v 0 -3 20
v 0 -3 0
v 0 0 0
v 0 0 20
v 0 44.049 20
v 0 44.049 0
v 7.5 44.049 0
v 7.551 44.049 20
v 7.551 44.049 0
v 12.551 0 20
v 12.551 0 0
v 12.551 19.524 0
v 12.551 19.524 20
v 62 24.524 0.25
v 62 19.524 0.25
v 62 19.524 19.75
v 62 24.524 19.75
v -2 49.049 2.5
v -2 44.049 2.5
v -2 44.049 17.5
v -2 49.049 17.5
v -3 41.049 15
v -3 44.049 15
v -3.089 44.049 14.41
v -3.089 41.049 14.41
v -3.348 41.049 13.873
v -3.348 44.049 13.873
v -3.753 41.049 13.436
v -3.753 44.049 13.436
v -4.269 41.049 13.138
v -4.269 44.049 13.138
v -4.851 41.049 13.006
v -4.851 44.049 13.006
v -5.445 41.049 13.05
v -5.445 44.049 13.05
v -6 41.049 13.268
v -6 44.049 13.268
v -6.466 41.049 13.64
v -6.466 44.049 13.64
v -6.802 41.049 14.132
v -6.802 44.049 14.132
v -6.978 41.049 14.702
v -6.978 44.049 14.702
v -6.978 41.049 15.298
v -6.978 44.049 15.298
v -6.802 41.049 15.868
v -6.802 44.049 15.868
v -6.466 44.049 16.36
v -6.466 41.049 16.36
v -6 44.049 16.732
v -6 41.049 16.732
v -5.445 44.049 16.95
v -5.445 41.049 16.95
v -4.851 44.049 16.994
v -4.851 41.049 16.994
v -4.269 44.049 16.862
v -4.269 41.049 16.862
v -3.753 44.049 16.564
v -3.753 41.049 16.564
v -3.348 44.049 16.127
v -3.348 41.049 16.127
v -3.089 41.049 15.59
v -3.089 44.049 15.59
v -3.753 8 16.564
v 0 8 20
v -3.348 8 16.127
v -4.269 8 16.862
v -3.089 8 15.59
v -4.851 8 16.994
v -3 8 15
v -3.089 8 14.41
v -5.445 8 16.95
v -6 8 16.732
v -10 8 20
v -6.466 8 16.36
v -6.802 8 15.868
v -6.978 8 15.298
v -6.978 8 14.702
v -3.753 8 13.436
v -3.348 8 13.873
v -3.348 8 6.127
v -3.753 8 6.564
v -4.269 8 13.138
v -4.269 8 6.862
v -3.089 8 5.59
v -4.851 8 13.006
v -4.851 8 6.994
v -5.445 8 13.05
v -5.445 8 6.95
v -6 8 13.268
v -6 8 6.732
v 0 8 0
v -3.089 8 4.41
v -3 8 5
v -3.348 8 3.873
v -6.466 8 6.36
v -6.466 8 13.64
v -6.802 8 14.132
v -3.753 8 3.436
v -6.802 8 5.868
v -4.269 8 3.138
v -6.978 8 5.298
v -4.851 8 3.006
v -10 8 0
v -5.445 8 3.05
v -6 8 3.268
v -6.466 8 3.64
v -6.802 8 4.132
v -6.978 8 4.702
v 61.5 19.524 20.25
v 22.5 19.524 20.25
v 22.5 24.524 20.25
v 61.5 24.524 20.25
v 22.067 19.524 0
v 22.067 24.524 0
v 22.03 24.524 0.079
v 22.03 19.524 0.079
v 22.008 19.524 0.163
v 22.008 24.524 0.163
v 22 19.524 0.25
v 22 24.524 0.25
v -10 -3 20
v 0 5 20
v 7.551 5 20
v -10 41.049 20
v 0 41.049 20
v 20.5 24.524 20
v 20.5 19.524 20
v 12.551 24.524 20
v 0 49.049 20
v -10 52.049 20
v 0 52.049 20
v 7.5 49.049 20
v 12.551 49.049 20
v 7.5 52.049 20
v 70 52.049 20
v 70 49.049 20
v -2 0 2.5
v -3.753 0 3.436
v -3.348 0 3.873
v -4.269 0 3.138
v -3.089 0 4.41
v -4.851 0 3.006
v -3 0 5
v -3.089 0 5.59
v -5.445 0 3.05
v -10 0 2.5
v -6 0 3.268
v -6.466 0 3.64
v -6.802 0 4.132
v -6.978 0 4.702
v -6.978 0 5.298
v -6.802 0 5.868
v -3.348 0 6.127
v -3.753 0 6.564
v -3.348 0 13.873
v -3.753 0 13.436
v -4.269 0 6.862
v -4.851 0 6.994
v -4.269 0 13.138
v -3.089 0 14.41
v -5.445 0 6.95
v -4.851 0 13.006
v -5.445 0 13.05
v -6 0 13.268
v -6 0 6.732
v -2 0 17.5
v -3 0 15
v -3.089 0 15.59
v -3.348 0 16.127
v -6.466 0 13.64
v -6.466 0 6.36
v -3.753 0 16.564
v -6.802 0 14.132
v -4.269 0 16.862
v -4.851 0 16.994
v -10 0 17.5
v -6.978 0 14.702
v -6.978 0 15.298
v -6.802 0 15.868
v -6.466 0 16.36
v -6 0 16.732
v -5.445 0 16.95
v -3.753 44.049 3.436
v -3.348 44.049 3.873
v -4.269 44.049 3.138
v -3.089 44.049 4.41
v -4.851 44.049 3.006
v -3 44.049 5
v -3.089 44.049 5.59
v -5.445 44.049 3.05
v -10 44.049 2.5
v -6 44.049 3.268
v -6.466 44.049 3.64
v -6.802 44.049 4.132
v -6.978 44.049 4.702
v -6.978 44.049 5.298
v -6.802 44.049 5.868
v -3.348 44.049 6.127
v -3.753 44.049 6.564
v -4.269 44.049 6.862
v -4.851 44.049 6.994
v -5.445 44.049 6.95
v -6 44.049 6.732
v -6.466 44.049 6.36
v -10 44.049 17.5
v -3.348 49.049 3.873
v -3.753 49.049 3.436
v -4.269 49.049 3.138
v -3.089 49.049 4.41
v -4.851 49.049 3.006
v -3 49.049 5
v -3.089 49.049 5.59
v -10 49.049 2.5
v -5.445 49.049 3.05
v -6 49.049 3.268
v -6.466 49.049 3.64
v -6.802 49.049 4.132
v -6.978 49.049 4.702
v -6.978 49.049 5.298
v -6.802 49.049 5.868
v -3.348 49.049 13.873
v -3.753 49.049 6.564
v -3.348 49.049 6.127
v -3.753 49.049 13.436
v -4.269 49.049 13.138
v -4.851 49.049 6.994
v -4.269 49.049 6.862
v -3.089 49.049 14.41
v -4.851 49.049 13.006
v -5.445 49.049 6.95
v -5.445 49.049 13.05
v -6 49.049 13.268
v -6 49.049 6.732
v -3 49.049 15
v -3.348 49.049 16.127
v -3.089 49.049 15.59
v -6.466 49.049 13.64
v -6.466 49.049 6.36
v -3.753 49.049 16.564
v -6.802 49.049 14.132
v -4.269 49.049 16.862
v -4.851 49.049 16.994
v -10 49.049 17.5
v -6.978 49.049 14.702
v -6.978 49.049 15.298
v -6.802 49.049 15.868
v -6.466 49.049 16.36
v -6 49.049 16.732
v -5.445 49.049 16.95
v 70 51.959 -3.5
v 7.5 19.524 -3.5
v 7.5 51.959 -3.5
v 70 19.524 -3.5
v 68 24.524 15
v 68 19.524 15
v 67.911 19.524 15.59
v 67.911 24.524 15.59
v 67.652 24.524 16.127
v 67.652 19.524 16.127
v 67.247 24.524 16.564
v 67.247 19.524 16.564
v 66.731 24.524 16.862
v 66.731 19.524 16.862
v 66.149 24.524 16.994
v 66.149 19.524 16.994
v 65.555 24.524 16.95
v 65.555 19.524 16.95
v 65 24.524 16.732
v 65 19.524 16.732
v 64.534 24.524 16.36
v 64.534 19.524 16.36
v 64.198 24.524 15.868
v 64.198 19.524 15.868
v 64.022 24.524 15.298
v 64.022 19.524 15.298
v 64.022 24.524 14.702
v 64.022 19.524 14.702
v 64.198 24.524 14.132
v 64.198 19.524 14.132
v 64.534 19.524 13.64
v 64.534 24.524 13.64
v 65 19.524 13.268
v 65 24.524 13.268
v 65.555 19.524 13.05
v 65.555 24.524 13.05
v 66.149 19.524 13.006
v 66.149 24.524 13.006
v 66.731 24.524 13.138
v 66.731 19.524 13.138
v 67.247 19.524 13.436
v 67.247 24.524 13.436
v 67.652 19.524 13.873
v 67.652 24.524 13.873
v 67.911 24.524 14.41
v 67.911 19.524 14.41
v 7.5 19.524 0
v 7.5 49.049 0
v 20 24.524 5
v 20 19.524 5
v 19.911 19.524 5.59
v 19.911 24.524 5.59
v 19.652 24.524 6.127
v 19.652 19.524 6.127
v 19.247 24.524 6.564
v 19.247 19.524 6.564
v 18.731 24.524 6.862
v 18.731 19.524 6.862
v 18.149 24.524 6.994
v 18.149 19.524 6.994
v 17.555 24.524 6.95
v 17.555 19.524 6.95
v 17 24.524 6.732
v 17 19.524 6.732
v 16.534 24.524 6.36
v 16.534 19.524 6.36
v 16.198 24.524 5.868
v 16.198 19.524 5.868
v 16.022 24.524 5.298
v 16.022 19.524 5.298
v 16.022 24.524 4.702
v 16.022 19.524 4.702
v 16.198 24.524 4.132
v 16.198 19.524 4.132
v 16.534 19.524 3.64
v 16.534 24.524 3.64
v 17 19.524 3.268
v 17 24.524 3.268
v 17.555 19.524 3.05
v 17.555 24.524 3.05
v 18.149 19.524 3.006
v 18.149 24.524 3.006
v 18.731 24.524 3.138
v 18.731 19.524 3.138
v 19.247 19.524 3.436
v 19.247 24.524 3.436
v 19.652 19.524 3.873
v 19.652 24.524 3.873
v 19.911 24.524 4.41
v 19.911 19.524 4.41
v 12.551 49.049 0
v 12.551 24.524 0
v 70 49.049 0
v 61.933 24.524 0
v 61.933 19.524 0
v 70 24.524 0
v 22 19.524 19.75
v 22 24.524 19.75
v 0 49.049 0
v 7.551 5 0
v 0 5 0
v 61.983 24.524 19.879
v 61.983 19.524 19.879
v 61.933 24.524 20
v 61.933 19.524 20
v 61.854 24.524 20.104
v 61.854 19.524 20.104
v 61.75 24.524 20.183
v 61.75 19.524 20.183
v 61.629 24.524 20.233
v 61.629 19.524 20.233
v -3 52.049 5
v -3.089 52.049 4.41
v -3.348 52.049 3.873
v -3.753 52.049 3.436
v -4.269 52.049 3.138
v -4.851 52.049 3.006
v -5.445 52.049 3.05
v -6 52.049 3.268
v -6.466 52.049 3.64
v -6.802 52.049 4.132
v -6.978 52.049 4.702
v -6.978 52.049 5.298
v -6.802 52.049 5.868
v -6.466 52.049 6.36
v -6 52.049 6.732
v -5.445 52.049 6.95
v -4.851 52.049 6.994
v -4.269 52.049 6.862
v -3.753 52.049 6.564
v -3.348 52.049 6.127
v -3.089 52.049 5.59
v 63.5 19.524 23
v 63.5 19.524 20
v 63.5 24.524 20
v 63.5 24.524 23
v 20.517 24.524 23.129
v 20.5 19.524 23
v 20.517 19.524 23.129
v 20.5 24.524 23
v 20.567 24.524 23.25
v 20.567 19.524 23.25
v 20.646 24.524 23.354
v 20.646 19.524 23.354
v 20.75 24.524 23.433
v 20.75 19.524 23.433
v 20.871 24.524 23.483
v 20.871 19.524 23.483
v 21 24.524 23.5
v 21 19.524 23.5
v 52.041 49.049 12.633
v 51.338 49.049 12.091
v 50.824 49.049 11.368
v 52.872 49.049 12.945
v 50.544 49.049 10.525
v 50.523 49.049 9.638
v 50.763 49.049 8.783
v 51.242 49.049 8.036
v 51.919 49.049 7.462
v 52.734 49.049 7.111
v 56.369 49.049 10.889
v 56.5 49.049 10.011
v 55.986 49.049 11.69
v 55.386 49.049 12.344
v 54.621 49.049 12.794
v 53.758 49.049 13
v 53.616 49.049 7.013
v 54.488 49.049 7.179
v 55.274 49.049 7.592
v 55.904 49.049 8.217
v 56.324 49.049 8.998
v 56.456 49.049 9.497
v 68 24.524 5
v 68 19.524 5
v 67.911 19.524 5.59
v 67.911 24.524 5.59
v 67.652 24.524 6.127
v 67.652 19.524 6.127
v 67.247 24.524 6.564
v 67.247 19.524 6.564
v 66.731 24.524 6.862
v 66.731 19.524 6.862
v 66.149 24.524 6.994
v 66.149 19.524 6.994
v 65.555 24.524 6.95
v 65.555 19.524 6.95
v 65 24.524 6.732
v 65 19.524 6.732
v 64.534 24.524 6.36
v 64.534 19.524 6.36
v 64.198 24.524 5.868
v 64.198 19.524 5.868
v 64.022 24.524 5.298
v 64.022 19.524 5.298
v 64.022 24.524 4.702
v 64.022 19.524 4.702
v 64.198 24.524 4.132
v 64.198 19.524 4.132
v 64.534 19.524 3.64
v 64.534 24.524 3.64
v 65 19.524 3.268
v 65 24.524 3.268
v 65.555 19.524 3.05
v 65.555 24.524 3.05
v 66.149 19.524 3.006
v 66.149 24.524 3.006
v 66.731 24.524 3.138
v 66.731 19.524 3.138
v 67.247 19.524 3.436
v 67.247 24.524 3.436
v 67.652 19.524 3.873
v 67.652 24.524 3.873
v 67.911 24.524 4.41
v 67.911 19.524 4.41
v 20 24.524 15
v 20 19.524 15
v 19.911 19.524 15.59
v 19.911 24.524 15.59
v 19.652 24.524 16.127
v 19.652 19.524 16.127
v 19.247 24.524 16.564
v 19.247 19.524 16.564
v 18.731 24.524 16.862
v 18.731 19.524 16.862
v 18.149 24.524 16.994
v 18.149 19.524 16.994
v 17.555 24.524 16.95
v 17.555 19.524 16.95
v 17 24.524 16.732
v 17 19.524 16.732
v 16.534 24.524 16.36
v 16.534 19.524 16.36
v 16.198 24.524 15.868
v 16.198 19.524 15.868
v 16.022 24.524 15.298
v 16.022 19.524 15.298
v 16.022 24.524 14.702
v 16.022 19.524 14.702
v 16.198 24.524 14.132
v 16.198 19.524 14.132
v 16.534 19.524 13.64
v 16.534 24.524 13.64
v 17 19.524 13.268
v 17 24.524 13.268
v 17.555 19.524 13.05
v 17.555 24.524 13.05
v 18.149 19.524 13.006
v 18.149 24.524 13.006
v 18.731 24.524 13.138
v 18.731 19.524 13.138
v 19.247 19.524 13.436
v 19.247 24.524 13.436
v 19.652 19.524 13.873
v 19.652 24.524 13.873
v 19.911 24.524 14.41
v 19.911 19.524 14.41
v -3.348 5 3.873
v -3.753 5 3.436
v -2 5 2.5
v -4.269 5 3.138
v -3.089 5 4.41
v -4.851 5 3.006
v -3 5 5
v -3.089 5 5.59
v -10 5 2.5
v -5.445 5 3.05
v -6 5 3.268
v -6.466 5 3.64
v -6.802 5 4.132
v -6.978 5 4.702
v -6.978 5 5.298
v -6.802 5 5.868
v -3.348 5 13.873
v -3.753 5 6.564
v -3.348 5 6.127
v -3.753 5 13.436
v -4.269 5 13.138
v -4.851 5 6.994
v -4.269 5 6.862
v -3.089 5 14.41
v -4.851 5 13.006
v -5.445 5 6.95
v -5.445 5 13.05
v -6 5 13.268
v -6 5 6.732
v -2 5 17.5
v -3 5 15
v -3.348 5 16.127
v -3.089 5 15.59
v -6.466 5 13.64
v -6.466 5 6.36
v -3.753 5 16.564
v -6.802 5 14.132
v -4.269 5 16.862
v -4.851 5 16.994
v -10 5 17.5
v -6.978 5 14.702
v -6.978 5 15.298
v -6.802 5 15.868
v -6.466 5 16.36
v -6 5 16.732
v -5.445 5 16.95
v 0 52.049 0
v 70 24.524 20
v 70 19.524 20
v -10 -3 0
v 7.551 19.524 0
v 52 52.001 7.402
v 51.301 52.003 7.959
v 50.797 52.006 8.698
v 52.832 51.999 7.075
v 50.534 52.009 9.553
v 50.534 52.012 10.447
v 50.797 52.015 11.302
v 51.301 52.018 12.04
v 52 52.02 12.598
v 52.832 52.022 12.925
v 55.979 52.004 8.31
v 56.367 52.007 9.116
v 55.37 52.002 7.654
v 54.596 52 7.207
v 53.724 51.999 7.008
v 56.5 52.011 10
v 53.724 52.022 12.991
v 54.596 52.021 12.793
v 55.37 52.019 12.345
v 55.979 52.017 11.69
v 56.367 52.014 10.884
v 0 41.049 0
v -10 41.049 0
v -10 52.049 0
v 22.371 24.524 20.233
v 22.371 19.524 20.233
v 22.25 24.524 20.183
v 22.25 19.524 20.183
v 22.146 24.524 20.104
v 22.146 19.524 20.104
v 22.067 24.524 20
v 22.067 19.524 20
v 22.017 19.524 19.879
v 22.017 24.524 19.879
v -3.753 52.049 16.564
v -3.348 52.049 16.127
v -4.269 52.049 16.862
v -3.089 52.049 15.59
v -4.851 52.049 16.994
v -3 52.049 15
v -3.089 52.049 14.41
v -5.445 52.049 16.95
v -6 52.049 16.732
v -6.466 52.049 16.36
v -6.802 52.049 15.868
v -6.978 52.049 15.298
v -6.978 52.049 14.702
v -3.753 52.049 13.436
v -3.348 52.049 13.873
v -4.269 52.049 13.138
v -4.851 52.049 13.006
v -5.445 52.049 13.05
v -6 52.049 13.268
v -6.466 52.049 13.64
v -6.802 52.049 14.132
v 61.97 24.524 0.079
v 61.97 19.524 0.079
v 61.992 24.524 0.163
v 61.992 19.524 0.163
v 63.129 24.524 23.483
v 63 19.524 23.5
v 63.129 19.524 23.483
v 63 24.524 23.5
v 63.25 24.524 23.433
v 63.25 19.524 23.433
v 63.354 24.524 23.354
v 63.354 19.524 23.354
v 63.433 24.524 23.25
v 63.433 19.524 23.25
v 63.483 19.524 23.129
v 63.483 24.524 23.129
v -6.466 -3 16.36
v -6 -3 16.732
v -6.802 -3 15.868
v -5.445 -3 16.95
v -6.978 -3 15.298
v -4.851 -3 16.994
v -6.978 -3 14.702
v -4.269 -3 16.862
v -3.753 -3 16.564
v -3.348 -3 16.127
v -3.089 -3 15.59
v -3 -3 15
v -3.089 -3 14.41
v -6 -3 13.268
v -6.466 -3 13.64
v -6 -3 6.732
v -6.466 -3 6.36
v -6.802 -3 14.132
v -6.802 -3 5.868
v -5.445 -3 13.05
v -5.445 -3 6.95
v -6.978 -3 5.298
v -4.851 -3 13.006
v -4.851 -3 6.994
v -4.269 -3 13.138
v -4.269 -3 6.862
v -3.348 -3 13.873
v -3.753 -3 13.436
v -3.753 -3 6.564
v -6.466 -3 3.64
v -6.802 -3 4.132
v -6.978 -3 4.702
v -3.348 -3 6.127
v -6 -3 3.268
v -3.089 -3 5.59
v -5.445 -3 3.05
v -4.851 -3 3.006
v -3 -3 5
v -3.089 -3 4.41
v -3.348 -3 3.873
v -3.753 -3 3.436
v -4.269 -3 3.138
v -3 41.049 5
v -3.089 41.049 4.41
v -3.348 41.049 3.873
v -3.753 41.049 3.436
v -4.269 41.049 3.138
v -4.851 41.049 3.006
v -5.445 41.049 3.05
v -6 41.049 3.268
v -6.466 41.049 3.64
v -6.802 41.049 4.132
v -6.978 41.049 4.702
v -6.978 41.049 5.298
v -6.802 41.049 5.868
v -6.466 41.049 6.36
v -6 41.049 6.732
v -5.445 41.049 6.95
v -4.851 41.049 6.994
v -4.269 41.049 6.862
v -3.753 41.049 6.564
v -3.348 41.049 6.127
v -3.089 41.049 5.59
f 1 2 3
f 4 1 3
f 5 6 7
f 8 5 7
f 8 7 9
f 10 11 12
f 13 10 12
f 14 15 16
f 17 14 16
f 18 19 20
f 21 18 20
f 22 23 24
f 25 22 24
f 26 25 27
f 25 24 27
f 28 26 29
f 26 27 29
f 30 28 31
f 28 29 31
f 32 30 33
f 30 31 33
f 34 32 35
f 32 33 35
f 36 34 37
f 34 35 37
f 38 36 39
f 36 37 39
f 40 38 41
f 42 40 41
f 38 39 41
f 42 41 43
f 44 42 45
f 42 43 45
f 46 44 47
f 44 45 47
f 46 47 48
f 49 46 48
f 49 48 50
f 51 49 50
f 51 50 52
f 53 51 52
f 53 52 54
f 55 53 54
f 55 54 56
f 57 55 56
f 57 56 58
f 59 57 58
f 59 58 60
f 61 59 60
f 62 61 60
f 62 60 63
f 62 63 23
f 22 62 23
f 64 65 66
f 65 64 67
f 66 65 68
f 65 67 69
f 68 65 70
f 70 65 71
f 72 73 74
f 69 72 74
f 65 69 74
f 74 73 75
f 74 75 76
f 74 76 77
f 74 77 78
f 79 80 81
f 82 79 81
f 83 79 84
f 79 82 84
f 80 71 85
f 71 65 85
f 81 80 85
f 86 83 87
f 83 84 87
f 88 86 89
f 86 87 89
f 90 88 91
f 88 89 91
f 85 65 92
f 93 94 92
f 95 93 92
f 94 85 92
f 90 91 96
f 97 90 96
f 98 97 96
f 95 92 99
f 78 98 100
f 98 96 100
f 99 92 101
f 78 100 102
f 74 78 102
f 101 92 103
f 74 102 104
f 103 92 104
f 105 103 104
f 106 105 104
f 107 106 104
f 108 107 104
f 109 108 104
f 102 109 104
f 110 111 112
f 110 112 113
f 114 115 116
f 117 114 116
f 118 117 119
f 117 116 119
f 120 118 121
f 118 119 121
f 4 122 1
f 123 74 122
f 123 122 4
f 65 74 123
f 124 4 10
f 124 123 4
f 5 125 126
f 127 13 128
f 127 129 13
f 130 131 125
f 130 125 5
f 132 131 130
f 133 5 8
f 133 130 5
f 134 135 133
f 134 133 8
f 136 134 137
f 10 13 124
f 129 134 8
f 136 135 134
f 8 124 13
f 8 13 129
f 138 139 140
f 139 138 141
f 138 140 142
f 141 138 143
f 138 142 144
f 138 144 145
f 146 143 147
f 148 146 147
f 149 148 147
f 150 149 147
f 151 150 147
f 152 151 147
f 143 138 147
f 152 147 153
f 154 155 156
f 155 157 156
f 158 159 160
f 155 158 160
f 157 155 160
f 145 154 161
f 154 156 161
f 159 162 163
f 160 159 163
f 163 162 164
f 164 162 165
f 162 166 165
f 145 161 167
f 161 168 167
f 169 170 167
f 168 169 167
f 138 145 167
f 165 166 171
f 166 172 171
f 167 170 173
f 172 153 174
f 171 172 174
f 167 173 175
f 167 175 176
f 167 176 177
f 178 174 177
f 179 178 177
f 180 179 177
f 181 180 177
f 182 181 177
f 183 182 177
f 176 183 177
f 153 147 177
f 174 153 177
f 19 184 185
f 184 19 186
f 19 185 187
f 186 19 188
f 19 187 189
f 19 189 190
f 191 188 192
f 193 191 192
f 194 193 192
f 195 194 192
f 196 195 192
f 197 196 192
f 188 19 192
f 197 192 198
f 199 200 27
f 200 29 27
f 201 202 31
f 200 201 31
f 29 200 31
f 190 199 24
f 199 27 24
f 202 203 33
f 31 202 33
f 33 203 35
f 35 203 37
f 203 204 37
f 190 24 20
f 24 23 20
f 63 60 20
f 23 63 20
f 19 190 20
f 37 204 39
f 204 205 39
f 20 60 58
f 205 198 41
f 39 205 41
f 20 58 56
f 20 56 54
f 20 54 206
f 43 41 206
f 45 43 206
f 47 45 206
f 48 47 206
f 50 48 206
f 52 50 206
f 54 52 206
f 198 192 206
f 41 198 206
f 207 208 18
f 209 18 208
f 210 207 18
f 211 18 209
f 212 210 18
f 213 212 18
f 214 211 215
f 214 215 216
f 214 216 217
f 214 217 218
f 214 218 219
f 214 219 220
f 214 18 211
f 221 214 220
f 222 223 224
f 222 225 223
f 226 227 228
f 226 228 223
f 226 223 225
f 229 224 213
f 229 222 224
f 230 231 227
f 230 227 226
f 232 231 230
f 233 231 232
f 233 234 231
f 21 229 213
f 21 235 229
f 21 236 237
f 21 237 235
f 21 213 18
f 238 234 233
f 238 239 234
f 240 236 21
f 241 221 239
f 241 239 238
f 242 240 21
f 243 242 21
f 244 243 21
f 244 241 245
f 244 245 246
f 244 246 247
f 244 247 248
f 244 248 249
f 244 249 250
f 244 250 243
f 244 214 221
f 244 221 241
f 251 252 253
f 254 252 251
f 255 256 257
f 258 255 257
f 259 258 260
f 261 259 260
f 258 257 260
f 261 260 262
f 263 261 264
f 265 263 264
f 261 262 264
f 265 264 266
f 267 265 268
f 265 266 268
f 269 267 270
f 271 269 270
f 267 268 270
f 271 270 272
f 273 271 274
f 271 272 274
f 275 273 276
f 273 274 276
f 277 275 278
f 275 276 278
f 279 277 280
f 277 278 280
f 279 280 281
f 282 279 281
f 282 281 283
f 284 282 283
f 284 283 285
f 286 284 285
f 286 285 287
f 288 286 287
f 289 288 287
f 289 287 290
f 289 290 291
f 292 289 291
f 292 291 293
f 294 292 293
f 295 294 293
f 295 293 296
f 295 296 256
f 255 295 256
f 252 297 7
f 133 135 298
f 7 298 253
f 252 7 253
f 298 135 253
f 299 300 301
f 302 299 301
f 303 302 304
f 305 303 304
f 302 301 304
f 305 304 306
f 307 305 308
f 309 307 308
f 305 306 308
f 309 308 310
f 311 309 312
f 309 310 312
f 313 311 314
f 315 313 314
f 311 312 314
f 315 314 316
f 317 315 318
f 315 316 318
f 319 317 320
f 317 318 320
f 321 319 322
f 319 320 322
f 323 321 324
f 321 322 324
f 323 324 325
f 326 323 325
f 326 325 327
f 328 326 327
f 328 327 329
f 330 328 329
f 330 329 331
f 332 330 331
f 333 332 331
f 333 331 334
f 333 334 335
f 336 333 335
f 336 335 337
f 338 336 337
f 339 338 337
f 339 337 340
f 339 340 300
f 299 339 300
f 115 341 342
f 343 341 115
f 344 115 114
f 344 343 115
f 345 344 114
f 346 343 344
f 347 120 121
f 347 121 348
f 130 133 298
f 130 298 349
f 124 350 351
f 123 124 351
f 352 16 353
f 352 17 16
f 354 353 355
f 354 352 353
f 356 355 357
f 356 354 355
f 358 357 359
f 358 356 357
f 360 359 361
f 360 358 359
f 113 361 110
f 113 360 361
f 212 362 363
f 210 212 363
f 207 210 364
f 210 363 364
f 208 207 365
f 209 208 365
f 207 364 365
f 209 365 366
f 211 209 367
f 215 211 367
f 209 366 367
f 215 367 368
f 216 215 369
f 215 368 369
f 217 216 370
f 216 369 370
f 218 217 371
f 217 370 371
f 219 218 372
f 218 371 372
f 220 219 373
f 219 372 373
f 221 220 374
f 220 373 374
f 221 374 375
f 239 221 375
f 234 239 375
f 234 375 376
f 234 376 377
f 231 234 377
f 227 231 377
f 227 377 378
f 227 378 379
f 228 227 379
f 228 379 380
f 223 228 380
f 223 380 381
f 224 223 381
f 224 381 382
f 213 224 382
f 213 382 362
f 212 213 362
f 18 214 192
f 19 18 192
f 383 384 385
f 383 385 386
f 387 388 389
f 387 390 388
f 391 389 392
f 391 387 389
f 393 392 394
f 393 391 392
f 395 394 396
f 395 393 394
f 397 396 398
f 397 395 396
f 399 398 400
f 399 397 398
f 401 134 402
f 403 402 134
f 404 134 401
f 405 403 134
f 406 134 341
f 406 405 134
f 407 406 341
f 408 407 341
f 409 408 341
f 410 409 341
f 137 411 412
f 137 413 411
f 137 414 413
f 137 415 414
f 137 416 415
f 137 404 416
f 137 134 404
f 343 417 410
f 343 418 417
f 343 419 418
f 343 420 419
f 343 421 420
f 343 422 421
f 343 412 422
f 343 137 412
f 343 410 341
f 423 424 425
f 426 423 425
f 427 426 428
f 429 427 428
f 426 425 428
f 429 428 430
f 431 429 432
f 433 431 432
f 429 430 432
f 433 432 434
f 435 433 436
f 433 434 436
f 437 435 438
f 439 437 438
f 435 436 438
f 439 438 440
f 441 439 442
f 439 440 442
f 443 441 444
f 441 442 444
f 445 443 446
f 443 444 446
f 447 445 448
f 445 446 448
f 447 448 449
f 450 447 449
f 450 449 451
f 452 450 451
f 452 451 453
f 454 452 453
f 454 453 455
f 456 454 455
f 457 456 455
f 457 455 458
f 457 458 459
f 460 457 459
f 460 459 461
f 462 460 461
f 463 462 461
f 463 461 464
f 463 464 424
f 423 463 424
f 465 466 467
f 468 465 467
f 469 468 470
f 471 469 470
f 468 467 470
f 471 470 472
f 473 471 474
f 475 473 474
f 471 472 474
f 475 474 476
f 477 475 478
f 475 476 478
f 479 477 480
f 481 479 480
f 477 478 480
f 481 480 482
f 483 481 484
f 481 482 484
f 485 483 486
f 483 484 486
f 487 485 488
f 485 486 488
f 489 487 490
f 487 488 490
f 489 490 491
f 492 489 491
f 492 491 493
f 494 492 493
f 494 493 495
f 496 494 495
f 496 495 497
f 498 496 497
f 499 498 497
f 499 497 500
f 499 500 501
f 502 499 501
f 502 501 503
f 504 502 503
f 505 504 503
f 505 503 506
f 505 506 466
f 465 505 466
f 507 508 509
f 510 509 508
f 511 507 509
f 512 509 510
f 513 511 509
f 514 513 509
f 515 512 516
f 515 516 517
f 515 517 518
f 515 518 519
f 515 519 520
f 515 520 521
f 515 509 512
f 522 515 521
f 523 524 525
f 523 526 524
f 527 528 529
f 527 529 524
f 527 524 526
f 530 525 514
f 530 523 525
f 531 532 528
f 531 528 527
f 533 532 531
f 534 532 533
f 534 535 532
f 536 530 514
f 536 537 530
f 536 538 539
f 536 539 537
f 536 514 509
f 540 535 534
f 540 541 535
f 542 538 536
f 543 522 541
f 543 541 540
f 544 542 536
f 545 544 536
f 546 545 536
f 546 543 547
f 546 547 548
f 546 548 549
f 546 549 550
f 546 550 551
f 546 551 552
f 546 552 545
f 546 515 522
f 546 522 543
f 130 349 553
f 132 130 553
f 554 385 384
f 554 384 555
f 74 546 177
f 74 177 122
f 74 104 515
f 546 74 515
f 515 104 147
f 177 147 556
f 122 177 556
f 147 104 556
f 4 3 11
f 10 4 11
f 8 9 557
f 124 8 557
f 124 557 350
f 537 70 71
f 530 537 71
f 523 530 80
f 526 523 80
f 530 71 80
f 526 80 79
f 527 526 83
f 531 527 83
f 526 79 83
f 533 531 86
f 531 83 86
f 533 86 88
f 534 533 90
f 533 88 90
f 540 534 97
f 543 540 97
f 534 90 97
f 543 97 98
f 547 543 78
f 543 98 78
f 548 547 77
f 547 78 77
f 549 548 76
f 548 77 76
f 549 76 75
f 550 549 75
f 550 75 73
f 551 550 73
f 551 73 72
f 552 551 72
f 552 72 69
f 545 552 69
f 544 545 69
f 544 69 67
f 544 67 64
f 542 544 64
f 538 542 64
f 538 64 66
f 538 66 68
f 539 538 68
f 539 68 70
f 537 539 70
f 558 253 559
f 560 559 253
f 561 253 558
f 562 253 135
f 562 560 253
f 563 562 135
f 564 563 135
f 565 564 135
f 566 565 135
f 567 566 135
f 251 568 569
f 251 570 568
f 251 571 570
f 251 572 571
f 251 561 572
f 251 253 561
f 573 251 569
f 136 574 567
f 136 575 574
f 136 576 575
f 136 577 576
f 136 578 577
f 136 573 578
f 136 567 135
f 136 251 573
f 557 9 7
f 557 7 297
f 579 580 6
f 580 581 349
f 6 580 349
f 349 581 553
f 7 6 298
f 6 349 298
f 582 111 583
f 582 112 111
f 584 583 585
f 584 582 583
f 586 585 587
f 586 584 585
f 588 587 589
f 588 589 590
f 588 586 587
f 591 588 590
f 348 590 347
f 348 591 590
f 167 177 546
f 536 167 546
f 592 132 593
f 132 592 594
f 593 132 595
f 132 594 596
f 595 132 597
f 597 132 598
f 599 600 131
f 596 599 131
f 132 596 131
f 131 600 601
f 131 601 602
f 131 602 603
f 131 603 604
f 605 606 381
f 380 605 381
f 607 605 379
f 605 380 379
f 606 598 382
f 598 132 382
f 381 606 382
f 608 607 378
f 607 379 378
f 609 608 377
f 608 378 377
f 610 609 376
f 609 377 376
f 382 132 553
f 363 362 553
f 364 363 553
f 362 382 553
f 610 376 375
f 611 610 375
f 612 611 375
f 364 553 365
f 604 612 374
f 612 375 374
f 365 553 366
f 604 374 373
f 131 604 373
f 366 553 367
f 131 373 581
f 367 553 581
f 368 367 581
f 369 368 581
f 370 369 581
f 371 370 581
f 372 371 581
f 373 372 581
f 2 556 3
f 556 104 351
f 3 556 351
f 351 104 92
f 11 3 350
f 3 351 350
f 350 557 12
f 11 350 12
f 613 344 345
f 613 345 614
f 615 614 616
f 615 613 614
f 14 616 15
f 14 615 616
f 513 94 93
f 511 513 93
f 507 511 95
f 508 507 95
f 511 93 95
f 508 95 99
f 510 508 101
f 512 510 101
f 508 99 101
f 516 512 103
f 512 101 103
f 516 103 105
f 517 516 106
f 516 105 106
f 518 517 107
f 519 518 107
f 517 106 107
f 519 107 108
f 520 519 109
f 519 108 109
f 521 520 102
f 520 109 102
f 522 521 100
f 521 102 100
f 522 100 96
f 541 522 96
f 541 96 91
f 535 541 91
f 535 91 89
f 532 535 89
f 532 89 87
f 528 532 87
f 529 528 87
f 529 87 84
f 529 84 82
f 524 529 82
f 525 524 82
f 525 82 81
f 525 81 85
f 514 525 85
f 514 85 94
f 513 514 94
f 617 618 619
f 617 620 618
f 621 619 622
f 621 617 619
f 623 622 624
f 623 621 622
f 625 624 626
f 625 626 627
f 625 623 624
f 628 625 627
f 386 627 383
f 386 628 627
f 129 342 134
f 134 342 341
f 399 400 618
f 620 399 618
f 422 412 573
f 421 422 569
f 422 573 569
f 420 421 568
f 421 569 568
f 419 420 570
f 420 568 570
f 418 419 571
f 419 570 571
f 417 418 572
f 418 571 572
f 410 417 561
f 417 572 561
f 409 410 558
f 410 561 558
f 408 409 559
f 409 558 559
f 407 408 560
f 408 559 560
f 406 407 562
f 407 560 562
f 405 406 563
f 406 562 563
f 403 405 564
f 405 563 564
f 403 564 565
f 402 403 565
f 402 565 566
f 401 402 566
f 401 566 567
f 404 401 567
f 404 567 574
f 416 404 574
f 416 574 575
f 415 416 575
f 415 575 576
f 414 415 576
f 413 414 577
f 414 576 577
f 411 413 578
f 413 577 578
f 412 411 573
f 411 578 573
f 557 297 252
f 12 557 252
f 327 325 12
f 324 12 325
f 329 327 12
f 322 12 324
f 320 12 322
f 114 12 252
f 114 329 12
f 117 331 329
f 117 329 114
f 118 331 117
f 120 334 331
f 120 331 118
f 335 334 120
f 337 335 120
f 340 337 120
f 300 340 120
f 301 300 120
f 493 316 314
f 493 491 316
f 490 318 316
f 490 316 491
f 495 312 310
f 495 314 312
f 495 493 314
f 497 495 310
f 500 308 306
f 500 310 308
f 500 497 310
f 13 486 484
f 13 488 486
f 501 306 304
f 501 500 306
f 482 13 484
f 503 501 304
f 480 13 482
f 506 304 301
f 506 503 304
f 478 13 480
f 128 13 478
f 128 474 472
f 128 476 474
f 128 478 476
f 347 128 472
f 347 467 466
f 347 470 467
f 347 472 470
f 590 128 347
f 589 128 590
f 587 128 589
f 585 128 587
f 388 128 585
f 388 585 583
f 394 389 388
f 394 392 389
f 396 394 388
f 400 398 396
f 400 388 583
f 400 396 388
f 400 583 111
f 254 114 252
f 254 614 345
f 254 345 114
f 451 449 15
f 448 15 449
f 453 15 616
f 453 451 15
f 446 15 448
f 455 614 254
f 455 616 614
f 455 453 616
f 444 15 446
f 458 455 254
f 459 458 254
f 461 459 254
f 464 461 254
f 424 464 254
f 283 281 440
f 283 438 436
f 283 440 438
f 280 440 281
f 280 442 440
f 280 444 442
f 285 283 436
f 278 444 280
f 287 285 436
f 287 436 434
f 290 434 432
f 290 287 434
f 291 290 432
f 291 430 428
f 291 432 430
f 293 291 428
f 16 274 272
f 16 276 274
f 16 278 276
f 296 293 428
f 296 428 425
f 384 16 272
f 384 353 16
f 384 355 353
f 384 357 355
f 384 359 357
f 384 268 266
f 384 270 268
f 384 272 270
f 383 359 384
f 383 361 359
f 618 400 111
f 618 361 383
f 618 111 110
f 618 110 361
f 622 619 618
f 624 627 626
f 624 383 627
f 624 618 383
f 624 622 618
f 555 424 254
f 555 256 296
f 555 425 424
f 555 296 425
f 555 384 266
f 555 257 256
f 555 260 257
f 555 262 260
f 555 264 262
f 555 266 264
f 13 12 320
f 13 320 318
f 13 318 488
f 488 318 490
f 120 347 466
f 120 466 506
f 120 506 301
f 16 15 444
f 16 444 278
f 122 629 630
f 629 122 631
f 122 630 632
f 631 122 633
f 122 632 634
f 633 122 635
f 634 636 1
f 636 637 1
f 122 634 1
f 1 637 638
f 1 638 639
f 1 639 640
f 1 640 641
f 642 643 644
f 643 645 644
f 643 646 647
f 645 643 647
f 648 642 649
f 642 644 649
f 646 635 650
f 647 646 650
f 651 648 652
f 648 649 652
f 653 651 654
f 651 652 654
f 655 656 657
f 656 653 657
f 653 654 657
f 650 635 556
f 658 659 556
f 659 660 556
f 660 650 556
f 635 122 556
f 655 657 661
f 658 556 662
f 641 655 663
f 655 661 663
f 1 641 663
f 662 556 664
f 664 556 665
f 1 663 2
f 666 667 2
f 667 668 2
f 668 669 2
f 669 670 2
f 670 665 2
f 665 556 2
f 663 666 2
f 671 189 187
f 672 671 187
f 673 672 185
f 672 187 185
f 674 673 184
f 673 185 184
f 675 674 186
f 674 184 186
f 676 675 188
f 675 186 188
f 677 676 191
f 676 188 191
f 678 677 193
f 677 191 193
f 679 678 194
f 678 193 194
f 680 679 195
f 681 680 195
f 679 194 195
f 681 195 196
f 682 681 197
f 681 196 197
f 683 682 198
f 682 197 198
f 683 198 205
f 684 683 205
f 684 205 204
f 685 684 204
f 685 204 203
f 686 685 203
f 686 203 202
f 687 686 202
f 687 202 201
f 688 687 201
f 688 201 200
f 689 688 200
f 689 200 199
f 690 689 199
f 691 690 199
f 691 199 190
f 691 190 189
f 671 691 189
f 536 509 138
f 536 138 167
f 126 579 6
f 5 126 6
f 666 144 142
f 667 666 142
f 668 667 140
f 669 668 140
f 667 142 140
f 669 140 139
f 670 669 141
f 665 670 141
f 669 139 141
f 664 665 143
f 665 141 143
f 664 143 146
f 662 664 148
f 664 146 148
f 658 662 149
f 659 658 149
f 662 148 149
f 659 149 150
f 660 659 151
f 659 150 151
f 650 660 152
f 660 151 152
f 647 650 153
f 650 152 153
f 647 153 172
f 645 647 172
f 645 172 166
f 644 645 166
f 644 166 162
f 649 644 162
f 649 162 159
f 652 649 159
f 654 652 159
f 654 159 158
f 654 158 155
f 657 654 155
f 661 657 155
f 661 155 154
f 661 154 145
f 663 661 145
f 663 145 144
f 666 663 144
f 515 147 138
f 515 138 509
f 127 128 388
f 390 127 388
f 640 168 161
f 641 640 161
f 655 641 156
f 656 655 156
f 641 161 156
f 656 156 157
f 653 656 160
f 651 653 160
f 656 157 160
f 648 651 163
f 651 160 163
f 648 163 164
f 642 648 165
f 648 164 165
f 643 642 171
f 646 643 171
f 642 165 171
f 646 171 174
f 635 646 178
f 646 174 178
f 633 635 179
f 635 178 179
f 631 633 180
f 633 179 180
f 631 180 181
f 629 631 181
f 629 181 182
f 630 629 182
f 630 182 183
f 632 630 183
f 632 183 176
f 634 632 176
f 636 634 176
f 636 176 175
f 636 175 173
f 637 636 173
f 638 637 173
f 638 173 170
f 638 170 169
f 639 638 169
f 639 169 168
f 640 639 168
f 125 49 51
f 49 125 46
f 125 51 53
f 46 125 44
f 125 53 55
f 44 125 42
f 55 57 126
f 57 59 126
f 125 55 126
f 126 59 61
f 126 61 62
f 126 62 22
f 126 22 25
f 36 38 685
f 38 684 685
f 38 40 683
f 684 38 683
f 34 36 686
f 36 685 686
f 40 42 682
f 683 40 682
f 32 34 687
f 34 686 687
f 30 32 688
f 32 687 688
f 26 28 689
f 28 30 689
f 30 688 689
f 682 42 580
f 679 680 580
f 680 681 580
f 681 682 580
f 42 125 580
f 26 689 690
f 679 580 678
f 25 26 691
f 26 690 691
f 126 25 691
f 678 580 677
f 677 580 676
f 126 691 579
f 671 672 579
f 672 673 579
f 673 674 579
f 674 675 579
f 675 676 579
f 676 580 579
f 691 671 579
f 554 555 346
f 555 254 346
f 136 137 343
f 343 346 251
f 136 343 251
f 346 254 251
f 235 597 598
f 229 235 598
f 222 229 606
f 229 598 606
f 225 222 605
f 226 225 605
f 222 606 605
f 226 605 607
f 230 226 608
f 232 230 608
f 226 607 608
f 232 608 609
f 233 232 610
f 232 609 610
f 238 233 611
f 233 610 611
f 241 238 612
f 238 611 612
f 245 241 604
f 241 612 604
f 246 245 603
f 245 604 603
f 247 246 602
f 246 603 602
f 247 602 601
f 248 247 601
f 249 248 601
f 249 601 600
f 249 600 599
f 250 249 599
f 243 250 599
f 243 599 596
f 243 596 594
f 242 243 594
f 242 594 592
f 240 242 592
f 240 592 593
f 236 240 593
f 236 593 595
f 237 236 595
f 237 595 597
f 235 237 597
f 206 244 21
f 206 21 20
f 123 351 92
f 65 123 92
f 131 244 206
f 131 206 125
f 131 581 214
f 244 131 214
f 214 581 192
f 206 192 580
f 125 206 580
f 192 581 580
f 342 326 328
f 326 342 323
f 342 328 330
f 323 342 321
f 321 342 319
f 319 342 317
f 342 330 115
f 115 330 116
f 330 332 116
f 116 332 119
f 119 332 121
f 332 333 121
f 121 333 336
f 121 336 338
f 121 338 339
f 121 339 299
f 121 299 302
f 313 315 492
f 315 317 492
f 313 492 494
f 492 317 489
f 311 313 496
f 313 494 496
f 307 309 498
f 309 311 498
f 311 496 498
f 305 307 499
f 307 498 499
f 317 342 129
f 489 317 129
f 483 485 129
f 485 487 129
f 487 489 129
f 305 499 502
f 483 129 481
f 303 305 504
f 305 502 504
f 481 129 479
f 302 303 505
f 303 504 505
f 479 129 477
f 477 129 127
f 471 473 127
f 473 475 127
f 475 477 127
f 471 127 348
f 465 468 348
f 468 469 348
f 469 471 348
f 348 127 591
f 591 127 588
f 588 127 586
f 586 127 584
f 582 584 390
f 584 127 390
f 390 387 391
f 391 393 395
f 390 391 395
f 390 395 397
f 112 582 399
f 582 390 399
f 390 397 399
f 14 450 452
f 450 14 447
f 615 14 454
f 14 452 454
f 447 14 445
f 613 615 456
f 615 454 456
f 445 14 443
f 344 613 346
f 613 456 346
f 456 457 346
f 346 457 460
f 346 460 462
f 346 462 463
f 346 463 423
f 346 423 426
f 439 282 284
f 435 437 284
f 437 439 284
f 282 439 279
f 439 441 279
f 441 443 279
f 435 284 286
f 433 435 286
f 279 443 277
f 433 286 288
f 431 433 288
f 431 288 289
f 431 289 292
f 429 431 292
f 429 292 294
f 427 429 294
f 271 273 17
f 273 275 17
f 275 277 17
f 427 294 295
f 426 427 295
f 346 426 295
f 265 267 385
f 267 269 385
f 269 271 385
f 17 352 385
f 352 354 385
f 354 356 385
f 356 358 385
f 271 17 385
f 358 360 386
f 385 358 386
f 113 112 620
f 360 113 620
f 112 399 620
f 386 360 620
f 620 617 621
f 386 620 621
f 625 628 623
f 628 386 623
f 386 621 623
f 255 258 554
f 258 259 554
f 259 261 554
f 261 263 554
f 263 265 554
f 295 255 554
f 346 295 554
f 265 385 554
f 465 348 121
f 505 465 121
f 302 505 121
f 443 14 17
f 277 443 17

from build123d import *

# Parameters (mm, degrees)
BOSS_EXTRUDE1_DEPTH = 20
SKETCH3_W           = 15
SKETCH3_H           = 5
CUT_EXTRUDE2_DEPTH  = 8
SKETCH4_R           = 2
CUT_EXTRUDE3_DEPTH  = 110
SKETCH2_R           = 2
CUT_EXTRUDE4_DEPTH  = 110
SKETCH5_W           = 43
SKETCH5_H           = 27
BOSS_EXTRUDE2_DEPTH = 5
SKETCH6_W           = 40
SKETCH6_H           = 20.5
CUT_EXTRUDE5_DEPTH  = 5
FILLET1_R           = 0.5
BOSS_EXTRUDE3_DEPTH = 62.5
SKETCH8_R           = 3
CUT_EXTRUDE6_DEPTH  = 62.5


with BuildPart() as part:
    # Sketch1 → Boss-Extrude1 (new body)
    with BuildSketch(Plane.XY):
        Polygon((0, 0), (12.551397955, 0), (12.551397955, 19.52439682), (70, 19.52439682), (70, 24.52439682), (12.551397955, 24.52439682), (12.551397955, 49.048793639), (0, 49.048793639), (0, 52.048793639), (-10, 52.048793639), (-10, 41.048793639), (0, 41.048793639), (0, 44.048793639), (7.551397955, 44.048793639), (7.551397955, 24.52439682), (7.551397955, 5), (0, 5), (0, 8), (-10, 8), (-10, -3), (0, -3), align=None)
    extrude(amount=BOSS_EXTRUDE1_DEPTH)

    # Sketch3 → Cut-Extrude2 (cut)
    with BuildSketch(Plane.ZY.offset(10)):
        with Locations((10, 2.5)):
            Rectangle(SKETCH3_W, SKETCH3_H)
    cut_extrude2 = extrude(amount=-CUT_EXTRUDE2_DEPTH, mode=Mode.SUBTRACT)

    # Mirror1: Cut-Extrude2 across plane
    add(cut_extrude2.mirror(Plane(origin=(12.551397955, 24.52439682, 20), x_dir=(0, 0, 1), z_dir=(0, -1, 0))), mode=Mode.SUBTRACT)

    # Sketch4 → Cut-Extrude3 (cut)
    with BuildSketch(Plane(origin=(0, 52.048793639, 0), x_dir=(1, 0, 0), z_dir=(0, 1, 0))):
        with Locations((-5, -5)):
            Circle(SKETCH4_R)
        with Locations((-5, -15)):
            Circle(SKETCH4_R)
    extrude(amount=-CUT_EXTRUDE3_DEPTH, mode=Mode.SUBTRACT)

    # Sketch2 → Cut-Extrude4 (cut)
    with BuildSketch(Plane.XZ.offset(-19.52439682)):
        with Locations((66, 15)):
            Circle(SKETCH2_R)
        with Locations((18, 15)):
            Circle(SKETCH2_R)
        with Locations((18, 5)):
            Circle(SKETCH2_R)
        with Locations((66, 5)):
            Circle(SKETCH2_R)
    extrude(amount=-CUT_EXTRUDE4_DEPTH, mode=Mode.SUBTRACT)

    # Sketch5 → Boss-Extrude2 (add)
    with BuildSketch(Plane.XZ.offset(-19.52439682)):
        with Locations((42, 10)):
            Rectangle(SKETCH5_W, SKETCH5_H)
    extrude(amount=-BOSS_EXTRUDE2_DEPTH)

    # Sketch6 → Cut-Extrude5 (cut)
    with BuildSketch(Plane.XZ.offset(-19.52439682)):
        with Locations((42, 10)):
            Rectangle(SKETCH6_W, SKETCH6_H)
    extrude(amount=-CUT_EXTRUDE5_DEPTH, mode=Mode.SUBTRACT)

    # Fillet1
    fillet1_edges = [part.edges().sort_by_distance(p)[0] for p in [
        (63.5, 22.02439682, 23.5),
        (63.5, 22.02439682, -3.5),
        (20.5, 22.02439682, -3.5),
        (20.5, 22.02439682, 23.5),
        (62, 22.02439682, 20.25),
        (62, 22.02439682, -0.25),
        (22, 22.02439682, -0.25),
        (22, 22.02439682, 20.25),
    ]]
    fillet(fillet1_edges, radius=FILLET1_R)

    # Sketch7 → Boss-Extrude3 (add)
    with BuildSketch(Plane(origin=(70, 0, 0), x_dir=(0, 0, -1), z_dir=(1, 0, 0))):
        Polygon((0, 19.52439682), (3.5, 19.52439682), (3.5, 51.958822175), (-20, 52.048793639), (-20, 49.048793639), (0, 49.048793639), align=None)
    extrude(amount=-BOSS_EXTRUDE3_DEPTH)

    # Sketch8 → Cut-Extrude6 (cut)
    with BuildSketch(Plane(origin=(0, 51.971460384, -0.198976528), x_dir=(1, 0, 0), z_dir=(0, 0.999992671, -0.003828545))):
        with Locations((53.5, -10.198952335)):
            Circle(SKETCH8_R)
    extrude(amount=-CUT_EXTRUDE6_DEPTH, mode=Mode.SUBTRACT)


solid = part.part
